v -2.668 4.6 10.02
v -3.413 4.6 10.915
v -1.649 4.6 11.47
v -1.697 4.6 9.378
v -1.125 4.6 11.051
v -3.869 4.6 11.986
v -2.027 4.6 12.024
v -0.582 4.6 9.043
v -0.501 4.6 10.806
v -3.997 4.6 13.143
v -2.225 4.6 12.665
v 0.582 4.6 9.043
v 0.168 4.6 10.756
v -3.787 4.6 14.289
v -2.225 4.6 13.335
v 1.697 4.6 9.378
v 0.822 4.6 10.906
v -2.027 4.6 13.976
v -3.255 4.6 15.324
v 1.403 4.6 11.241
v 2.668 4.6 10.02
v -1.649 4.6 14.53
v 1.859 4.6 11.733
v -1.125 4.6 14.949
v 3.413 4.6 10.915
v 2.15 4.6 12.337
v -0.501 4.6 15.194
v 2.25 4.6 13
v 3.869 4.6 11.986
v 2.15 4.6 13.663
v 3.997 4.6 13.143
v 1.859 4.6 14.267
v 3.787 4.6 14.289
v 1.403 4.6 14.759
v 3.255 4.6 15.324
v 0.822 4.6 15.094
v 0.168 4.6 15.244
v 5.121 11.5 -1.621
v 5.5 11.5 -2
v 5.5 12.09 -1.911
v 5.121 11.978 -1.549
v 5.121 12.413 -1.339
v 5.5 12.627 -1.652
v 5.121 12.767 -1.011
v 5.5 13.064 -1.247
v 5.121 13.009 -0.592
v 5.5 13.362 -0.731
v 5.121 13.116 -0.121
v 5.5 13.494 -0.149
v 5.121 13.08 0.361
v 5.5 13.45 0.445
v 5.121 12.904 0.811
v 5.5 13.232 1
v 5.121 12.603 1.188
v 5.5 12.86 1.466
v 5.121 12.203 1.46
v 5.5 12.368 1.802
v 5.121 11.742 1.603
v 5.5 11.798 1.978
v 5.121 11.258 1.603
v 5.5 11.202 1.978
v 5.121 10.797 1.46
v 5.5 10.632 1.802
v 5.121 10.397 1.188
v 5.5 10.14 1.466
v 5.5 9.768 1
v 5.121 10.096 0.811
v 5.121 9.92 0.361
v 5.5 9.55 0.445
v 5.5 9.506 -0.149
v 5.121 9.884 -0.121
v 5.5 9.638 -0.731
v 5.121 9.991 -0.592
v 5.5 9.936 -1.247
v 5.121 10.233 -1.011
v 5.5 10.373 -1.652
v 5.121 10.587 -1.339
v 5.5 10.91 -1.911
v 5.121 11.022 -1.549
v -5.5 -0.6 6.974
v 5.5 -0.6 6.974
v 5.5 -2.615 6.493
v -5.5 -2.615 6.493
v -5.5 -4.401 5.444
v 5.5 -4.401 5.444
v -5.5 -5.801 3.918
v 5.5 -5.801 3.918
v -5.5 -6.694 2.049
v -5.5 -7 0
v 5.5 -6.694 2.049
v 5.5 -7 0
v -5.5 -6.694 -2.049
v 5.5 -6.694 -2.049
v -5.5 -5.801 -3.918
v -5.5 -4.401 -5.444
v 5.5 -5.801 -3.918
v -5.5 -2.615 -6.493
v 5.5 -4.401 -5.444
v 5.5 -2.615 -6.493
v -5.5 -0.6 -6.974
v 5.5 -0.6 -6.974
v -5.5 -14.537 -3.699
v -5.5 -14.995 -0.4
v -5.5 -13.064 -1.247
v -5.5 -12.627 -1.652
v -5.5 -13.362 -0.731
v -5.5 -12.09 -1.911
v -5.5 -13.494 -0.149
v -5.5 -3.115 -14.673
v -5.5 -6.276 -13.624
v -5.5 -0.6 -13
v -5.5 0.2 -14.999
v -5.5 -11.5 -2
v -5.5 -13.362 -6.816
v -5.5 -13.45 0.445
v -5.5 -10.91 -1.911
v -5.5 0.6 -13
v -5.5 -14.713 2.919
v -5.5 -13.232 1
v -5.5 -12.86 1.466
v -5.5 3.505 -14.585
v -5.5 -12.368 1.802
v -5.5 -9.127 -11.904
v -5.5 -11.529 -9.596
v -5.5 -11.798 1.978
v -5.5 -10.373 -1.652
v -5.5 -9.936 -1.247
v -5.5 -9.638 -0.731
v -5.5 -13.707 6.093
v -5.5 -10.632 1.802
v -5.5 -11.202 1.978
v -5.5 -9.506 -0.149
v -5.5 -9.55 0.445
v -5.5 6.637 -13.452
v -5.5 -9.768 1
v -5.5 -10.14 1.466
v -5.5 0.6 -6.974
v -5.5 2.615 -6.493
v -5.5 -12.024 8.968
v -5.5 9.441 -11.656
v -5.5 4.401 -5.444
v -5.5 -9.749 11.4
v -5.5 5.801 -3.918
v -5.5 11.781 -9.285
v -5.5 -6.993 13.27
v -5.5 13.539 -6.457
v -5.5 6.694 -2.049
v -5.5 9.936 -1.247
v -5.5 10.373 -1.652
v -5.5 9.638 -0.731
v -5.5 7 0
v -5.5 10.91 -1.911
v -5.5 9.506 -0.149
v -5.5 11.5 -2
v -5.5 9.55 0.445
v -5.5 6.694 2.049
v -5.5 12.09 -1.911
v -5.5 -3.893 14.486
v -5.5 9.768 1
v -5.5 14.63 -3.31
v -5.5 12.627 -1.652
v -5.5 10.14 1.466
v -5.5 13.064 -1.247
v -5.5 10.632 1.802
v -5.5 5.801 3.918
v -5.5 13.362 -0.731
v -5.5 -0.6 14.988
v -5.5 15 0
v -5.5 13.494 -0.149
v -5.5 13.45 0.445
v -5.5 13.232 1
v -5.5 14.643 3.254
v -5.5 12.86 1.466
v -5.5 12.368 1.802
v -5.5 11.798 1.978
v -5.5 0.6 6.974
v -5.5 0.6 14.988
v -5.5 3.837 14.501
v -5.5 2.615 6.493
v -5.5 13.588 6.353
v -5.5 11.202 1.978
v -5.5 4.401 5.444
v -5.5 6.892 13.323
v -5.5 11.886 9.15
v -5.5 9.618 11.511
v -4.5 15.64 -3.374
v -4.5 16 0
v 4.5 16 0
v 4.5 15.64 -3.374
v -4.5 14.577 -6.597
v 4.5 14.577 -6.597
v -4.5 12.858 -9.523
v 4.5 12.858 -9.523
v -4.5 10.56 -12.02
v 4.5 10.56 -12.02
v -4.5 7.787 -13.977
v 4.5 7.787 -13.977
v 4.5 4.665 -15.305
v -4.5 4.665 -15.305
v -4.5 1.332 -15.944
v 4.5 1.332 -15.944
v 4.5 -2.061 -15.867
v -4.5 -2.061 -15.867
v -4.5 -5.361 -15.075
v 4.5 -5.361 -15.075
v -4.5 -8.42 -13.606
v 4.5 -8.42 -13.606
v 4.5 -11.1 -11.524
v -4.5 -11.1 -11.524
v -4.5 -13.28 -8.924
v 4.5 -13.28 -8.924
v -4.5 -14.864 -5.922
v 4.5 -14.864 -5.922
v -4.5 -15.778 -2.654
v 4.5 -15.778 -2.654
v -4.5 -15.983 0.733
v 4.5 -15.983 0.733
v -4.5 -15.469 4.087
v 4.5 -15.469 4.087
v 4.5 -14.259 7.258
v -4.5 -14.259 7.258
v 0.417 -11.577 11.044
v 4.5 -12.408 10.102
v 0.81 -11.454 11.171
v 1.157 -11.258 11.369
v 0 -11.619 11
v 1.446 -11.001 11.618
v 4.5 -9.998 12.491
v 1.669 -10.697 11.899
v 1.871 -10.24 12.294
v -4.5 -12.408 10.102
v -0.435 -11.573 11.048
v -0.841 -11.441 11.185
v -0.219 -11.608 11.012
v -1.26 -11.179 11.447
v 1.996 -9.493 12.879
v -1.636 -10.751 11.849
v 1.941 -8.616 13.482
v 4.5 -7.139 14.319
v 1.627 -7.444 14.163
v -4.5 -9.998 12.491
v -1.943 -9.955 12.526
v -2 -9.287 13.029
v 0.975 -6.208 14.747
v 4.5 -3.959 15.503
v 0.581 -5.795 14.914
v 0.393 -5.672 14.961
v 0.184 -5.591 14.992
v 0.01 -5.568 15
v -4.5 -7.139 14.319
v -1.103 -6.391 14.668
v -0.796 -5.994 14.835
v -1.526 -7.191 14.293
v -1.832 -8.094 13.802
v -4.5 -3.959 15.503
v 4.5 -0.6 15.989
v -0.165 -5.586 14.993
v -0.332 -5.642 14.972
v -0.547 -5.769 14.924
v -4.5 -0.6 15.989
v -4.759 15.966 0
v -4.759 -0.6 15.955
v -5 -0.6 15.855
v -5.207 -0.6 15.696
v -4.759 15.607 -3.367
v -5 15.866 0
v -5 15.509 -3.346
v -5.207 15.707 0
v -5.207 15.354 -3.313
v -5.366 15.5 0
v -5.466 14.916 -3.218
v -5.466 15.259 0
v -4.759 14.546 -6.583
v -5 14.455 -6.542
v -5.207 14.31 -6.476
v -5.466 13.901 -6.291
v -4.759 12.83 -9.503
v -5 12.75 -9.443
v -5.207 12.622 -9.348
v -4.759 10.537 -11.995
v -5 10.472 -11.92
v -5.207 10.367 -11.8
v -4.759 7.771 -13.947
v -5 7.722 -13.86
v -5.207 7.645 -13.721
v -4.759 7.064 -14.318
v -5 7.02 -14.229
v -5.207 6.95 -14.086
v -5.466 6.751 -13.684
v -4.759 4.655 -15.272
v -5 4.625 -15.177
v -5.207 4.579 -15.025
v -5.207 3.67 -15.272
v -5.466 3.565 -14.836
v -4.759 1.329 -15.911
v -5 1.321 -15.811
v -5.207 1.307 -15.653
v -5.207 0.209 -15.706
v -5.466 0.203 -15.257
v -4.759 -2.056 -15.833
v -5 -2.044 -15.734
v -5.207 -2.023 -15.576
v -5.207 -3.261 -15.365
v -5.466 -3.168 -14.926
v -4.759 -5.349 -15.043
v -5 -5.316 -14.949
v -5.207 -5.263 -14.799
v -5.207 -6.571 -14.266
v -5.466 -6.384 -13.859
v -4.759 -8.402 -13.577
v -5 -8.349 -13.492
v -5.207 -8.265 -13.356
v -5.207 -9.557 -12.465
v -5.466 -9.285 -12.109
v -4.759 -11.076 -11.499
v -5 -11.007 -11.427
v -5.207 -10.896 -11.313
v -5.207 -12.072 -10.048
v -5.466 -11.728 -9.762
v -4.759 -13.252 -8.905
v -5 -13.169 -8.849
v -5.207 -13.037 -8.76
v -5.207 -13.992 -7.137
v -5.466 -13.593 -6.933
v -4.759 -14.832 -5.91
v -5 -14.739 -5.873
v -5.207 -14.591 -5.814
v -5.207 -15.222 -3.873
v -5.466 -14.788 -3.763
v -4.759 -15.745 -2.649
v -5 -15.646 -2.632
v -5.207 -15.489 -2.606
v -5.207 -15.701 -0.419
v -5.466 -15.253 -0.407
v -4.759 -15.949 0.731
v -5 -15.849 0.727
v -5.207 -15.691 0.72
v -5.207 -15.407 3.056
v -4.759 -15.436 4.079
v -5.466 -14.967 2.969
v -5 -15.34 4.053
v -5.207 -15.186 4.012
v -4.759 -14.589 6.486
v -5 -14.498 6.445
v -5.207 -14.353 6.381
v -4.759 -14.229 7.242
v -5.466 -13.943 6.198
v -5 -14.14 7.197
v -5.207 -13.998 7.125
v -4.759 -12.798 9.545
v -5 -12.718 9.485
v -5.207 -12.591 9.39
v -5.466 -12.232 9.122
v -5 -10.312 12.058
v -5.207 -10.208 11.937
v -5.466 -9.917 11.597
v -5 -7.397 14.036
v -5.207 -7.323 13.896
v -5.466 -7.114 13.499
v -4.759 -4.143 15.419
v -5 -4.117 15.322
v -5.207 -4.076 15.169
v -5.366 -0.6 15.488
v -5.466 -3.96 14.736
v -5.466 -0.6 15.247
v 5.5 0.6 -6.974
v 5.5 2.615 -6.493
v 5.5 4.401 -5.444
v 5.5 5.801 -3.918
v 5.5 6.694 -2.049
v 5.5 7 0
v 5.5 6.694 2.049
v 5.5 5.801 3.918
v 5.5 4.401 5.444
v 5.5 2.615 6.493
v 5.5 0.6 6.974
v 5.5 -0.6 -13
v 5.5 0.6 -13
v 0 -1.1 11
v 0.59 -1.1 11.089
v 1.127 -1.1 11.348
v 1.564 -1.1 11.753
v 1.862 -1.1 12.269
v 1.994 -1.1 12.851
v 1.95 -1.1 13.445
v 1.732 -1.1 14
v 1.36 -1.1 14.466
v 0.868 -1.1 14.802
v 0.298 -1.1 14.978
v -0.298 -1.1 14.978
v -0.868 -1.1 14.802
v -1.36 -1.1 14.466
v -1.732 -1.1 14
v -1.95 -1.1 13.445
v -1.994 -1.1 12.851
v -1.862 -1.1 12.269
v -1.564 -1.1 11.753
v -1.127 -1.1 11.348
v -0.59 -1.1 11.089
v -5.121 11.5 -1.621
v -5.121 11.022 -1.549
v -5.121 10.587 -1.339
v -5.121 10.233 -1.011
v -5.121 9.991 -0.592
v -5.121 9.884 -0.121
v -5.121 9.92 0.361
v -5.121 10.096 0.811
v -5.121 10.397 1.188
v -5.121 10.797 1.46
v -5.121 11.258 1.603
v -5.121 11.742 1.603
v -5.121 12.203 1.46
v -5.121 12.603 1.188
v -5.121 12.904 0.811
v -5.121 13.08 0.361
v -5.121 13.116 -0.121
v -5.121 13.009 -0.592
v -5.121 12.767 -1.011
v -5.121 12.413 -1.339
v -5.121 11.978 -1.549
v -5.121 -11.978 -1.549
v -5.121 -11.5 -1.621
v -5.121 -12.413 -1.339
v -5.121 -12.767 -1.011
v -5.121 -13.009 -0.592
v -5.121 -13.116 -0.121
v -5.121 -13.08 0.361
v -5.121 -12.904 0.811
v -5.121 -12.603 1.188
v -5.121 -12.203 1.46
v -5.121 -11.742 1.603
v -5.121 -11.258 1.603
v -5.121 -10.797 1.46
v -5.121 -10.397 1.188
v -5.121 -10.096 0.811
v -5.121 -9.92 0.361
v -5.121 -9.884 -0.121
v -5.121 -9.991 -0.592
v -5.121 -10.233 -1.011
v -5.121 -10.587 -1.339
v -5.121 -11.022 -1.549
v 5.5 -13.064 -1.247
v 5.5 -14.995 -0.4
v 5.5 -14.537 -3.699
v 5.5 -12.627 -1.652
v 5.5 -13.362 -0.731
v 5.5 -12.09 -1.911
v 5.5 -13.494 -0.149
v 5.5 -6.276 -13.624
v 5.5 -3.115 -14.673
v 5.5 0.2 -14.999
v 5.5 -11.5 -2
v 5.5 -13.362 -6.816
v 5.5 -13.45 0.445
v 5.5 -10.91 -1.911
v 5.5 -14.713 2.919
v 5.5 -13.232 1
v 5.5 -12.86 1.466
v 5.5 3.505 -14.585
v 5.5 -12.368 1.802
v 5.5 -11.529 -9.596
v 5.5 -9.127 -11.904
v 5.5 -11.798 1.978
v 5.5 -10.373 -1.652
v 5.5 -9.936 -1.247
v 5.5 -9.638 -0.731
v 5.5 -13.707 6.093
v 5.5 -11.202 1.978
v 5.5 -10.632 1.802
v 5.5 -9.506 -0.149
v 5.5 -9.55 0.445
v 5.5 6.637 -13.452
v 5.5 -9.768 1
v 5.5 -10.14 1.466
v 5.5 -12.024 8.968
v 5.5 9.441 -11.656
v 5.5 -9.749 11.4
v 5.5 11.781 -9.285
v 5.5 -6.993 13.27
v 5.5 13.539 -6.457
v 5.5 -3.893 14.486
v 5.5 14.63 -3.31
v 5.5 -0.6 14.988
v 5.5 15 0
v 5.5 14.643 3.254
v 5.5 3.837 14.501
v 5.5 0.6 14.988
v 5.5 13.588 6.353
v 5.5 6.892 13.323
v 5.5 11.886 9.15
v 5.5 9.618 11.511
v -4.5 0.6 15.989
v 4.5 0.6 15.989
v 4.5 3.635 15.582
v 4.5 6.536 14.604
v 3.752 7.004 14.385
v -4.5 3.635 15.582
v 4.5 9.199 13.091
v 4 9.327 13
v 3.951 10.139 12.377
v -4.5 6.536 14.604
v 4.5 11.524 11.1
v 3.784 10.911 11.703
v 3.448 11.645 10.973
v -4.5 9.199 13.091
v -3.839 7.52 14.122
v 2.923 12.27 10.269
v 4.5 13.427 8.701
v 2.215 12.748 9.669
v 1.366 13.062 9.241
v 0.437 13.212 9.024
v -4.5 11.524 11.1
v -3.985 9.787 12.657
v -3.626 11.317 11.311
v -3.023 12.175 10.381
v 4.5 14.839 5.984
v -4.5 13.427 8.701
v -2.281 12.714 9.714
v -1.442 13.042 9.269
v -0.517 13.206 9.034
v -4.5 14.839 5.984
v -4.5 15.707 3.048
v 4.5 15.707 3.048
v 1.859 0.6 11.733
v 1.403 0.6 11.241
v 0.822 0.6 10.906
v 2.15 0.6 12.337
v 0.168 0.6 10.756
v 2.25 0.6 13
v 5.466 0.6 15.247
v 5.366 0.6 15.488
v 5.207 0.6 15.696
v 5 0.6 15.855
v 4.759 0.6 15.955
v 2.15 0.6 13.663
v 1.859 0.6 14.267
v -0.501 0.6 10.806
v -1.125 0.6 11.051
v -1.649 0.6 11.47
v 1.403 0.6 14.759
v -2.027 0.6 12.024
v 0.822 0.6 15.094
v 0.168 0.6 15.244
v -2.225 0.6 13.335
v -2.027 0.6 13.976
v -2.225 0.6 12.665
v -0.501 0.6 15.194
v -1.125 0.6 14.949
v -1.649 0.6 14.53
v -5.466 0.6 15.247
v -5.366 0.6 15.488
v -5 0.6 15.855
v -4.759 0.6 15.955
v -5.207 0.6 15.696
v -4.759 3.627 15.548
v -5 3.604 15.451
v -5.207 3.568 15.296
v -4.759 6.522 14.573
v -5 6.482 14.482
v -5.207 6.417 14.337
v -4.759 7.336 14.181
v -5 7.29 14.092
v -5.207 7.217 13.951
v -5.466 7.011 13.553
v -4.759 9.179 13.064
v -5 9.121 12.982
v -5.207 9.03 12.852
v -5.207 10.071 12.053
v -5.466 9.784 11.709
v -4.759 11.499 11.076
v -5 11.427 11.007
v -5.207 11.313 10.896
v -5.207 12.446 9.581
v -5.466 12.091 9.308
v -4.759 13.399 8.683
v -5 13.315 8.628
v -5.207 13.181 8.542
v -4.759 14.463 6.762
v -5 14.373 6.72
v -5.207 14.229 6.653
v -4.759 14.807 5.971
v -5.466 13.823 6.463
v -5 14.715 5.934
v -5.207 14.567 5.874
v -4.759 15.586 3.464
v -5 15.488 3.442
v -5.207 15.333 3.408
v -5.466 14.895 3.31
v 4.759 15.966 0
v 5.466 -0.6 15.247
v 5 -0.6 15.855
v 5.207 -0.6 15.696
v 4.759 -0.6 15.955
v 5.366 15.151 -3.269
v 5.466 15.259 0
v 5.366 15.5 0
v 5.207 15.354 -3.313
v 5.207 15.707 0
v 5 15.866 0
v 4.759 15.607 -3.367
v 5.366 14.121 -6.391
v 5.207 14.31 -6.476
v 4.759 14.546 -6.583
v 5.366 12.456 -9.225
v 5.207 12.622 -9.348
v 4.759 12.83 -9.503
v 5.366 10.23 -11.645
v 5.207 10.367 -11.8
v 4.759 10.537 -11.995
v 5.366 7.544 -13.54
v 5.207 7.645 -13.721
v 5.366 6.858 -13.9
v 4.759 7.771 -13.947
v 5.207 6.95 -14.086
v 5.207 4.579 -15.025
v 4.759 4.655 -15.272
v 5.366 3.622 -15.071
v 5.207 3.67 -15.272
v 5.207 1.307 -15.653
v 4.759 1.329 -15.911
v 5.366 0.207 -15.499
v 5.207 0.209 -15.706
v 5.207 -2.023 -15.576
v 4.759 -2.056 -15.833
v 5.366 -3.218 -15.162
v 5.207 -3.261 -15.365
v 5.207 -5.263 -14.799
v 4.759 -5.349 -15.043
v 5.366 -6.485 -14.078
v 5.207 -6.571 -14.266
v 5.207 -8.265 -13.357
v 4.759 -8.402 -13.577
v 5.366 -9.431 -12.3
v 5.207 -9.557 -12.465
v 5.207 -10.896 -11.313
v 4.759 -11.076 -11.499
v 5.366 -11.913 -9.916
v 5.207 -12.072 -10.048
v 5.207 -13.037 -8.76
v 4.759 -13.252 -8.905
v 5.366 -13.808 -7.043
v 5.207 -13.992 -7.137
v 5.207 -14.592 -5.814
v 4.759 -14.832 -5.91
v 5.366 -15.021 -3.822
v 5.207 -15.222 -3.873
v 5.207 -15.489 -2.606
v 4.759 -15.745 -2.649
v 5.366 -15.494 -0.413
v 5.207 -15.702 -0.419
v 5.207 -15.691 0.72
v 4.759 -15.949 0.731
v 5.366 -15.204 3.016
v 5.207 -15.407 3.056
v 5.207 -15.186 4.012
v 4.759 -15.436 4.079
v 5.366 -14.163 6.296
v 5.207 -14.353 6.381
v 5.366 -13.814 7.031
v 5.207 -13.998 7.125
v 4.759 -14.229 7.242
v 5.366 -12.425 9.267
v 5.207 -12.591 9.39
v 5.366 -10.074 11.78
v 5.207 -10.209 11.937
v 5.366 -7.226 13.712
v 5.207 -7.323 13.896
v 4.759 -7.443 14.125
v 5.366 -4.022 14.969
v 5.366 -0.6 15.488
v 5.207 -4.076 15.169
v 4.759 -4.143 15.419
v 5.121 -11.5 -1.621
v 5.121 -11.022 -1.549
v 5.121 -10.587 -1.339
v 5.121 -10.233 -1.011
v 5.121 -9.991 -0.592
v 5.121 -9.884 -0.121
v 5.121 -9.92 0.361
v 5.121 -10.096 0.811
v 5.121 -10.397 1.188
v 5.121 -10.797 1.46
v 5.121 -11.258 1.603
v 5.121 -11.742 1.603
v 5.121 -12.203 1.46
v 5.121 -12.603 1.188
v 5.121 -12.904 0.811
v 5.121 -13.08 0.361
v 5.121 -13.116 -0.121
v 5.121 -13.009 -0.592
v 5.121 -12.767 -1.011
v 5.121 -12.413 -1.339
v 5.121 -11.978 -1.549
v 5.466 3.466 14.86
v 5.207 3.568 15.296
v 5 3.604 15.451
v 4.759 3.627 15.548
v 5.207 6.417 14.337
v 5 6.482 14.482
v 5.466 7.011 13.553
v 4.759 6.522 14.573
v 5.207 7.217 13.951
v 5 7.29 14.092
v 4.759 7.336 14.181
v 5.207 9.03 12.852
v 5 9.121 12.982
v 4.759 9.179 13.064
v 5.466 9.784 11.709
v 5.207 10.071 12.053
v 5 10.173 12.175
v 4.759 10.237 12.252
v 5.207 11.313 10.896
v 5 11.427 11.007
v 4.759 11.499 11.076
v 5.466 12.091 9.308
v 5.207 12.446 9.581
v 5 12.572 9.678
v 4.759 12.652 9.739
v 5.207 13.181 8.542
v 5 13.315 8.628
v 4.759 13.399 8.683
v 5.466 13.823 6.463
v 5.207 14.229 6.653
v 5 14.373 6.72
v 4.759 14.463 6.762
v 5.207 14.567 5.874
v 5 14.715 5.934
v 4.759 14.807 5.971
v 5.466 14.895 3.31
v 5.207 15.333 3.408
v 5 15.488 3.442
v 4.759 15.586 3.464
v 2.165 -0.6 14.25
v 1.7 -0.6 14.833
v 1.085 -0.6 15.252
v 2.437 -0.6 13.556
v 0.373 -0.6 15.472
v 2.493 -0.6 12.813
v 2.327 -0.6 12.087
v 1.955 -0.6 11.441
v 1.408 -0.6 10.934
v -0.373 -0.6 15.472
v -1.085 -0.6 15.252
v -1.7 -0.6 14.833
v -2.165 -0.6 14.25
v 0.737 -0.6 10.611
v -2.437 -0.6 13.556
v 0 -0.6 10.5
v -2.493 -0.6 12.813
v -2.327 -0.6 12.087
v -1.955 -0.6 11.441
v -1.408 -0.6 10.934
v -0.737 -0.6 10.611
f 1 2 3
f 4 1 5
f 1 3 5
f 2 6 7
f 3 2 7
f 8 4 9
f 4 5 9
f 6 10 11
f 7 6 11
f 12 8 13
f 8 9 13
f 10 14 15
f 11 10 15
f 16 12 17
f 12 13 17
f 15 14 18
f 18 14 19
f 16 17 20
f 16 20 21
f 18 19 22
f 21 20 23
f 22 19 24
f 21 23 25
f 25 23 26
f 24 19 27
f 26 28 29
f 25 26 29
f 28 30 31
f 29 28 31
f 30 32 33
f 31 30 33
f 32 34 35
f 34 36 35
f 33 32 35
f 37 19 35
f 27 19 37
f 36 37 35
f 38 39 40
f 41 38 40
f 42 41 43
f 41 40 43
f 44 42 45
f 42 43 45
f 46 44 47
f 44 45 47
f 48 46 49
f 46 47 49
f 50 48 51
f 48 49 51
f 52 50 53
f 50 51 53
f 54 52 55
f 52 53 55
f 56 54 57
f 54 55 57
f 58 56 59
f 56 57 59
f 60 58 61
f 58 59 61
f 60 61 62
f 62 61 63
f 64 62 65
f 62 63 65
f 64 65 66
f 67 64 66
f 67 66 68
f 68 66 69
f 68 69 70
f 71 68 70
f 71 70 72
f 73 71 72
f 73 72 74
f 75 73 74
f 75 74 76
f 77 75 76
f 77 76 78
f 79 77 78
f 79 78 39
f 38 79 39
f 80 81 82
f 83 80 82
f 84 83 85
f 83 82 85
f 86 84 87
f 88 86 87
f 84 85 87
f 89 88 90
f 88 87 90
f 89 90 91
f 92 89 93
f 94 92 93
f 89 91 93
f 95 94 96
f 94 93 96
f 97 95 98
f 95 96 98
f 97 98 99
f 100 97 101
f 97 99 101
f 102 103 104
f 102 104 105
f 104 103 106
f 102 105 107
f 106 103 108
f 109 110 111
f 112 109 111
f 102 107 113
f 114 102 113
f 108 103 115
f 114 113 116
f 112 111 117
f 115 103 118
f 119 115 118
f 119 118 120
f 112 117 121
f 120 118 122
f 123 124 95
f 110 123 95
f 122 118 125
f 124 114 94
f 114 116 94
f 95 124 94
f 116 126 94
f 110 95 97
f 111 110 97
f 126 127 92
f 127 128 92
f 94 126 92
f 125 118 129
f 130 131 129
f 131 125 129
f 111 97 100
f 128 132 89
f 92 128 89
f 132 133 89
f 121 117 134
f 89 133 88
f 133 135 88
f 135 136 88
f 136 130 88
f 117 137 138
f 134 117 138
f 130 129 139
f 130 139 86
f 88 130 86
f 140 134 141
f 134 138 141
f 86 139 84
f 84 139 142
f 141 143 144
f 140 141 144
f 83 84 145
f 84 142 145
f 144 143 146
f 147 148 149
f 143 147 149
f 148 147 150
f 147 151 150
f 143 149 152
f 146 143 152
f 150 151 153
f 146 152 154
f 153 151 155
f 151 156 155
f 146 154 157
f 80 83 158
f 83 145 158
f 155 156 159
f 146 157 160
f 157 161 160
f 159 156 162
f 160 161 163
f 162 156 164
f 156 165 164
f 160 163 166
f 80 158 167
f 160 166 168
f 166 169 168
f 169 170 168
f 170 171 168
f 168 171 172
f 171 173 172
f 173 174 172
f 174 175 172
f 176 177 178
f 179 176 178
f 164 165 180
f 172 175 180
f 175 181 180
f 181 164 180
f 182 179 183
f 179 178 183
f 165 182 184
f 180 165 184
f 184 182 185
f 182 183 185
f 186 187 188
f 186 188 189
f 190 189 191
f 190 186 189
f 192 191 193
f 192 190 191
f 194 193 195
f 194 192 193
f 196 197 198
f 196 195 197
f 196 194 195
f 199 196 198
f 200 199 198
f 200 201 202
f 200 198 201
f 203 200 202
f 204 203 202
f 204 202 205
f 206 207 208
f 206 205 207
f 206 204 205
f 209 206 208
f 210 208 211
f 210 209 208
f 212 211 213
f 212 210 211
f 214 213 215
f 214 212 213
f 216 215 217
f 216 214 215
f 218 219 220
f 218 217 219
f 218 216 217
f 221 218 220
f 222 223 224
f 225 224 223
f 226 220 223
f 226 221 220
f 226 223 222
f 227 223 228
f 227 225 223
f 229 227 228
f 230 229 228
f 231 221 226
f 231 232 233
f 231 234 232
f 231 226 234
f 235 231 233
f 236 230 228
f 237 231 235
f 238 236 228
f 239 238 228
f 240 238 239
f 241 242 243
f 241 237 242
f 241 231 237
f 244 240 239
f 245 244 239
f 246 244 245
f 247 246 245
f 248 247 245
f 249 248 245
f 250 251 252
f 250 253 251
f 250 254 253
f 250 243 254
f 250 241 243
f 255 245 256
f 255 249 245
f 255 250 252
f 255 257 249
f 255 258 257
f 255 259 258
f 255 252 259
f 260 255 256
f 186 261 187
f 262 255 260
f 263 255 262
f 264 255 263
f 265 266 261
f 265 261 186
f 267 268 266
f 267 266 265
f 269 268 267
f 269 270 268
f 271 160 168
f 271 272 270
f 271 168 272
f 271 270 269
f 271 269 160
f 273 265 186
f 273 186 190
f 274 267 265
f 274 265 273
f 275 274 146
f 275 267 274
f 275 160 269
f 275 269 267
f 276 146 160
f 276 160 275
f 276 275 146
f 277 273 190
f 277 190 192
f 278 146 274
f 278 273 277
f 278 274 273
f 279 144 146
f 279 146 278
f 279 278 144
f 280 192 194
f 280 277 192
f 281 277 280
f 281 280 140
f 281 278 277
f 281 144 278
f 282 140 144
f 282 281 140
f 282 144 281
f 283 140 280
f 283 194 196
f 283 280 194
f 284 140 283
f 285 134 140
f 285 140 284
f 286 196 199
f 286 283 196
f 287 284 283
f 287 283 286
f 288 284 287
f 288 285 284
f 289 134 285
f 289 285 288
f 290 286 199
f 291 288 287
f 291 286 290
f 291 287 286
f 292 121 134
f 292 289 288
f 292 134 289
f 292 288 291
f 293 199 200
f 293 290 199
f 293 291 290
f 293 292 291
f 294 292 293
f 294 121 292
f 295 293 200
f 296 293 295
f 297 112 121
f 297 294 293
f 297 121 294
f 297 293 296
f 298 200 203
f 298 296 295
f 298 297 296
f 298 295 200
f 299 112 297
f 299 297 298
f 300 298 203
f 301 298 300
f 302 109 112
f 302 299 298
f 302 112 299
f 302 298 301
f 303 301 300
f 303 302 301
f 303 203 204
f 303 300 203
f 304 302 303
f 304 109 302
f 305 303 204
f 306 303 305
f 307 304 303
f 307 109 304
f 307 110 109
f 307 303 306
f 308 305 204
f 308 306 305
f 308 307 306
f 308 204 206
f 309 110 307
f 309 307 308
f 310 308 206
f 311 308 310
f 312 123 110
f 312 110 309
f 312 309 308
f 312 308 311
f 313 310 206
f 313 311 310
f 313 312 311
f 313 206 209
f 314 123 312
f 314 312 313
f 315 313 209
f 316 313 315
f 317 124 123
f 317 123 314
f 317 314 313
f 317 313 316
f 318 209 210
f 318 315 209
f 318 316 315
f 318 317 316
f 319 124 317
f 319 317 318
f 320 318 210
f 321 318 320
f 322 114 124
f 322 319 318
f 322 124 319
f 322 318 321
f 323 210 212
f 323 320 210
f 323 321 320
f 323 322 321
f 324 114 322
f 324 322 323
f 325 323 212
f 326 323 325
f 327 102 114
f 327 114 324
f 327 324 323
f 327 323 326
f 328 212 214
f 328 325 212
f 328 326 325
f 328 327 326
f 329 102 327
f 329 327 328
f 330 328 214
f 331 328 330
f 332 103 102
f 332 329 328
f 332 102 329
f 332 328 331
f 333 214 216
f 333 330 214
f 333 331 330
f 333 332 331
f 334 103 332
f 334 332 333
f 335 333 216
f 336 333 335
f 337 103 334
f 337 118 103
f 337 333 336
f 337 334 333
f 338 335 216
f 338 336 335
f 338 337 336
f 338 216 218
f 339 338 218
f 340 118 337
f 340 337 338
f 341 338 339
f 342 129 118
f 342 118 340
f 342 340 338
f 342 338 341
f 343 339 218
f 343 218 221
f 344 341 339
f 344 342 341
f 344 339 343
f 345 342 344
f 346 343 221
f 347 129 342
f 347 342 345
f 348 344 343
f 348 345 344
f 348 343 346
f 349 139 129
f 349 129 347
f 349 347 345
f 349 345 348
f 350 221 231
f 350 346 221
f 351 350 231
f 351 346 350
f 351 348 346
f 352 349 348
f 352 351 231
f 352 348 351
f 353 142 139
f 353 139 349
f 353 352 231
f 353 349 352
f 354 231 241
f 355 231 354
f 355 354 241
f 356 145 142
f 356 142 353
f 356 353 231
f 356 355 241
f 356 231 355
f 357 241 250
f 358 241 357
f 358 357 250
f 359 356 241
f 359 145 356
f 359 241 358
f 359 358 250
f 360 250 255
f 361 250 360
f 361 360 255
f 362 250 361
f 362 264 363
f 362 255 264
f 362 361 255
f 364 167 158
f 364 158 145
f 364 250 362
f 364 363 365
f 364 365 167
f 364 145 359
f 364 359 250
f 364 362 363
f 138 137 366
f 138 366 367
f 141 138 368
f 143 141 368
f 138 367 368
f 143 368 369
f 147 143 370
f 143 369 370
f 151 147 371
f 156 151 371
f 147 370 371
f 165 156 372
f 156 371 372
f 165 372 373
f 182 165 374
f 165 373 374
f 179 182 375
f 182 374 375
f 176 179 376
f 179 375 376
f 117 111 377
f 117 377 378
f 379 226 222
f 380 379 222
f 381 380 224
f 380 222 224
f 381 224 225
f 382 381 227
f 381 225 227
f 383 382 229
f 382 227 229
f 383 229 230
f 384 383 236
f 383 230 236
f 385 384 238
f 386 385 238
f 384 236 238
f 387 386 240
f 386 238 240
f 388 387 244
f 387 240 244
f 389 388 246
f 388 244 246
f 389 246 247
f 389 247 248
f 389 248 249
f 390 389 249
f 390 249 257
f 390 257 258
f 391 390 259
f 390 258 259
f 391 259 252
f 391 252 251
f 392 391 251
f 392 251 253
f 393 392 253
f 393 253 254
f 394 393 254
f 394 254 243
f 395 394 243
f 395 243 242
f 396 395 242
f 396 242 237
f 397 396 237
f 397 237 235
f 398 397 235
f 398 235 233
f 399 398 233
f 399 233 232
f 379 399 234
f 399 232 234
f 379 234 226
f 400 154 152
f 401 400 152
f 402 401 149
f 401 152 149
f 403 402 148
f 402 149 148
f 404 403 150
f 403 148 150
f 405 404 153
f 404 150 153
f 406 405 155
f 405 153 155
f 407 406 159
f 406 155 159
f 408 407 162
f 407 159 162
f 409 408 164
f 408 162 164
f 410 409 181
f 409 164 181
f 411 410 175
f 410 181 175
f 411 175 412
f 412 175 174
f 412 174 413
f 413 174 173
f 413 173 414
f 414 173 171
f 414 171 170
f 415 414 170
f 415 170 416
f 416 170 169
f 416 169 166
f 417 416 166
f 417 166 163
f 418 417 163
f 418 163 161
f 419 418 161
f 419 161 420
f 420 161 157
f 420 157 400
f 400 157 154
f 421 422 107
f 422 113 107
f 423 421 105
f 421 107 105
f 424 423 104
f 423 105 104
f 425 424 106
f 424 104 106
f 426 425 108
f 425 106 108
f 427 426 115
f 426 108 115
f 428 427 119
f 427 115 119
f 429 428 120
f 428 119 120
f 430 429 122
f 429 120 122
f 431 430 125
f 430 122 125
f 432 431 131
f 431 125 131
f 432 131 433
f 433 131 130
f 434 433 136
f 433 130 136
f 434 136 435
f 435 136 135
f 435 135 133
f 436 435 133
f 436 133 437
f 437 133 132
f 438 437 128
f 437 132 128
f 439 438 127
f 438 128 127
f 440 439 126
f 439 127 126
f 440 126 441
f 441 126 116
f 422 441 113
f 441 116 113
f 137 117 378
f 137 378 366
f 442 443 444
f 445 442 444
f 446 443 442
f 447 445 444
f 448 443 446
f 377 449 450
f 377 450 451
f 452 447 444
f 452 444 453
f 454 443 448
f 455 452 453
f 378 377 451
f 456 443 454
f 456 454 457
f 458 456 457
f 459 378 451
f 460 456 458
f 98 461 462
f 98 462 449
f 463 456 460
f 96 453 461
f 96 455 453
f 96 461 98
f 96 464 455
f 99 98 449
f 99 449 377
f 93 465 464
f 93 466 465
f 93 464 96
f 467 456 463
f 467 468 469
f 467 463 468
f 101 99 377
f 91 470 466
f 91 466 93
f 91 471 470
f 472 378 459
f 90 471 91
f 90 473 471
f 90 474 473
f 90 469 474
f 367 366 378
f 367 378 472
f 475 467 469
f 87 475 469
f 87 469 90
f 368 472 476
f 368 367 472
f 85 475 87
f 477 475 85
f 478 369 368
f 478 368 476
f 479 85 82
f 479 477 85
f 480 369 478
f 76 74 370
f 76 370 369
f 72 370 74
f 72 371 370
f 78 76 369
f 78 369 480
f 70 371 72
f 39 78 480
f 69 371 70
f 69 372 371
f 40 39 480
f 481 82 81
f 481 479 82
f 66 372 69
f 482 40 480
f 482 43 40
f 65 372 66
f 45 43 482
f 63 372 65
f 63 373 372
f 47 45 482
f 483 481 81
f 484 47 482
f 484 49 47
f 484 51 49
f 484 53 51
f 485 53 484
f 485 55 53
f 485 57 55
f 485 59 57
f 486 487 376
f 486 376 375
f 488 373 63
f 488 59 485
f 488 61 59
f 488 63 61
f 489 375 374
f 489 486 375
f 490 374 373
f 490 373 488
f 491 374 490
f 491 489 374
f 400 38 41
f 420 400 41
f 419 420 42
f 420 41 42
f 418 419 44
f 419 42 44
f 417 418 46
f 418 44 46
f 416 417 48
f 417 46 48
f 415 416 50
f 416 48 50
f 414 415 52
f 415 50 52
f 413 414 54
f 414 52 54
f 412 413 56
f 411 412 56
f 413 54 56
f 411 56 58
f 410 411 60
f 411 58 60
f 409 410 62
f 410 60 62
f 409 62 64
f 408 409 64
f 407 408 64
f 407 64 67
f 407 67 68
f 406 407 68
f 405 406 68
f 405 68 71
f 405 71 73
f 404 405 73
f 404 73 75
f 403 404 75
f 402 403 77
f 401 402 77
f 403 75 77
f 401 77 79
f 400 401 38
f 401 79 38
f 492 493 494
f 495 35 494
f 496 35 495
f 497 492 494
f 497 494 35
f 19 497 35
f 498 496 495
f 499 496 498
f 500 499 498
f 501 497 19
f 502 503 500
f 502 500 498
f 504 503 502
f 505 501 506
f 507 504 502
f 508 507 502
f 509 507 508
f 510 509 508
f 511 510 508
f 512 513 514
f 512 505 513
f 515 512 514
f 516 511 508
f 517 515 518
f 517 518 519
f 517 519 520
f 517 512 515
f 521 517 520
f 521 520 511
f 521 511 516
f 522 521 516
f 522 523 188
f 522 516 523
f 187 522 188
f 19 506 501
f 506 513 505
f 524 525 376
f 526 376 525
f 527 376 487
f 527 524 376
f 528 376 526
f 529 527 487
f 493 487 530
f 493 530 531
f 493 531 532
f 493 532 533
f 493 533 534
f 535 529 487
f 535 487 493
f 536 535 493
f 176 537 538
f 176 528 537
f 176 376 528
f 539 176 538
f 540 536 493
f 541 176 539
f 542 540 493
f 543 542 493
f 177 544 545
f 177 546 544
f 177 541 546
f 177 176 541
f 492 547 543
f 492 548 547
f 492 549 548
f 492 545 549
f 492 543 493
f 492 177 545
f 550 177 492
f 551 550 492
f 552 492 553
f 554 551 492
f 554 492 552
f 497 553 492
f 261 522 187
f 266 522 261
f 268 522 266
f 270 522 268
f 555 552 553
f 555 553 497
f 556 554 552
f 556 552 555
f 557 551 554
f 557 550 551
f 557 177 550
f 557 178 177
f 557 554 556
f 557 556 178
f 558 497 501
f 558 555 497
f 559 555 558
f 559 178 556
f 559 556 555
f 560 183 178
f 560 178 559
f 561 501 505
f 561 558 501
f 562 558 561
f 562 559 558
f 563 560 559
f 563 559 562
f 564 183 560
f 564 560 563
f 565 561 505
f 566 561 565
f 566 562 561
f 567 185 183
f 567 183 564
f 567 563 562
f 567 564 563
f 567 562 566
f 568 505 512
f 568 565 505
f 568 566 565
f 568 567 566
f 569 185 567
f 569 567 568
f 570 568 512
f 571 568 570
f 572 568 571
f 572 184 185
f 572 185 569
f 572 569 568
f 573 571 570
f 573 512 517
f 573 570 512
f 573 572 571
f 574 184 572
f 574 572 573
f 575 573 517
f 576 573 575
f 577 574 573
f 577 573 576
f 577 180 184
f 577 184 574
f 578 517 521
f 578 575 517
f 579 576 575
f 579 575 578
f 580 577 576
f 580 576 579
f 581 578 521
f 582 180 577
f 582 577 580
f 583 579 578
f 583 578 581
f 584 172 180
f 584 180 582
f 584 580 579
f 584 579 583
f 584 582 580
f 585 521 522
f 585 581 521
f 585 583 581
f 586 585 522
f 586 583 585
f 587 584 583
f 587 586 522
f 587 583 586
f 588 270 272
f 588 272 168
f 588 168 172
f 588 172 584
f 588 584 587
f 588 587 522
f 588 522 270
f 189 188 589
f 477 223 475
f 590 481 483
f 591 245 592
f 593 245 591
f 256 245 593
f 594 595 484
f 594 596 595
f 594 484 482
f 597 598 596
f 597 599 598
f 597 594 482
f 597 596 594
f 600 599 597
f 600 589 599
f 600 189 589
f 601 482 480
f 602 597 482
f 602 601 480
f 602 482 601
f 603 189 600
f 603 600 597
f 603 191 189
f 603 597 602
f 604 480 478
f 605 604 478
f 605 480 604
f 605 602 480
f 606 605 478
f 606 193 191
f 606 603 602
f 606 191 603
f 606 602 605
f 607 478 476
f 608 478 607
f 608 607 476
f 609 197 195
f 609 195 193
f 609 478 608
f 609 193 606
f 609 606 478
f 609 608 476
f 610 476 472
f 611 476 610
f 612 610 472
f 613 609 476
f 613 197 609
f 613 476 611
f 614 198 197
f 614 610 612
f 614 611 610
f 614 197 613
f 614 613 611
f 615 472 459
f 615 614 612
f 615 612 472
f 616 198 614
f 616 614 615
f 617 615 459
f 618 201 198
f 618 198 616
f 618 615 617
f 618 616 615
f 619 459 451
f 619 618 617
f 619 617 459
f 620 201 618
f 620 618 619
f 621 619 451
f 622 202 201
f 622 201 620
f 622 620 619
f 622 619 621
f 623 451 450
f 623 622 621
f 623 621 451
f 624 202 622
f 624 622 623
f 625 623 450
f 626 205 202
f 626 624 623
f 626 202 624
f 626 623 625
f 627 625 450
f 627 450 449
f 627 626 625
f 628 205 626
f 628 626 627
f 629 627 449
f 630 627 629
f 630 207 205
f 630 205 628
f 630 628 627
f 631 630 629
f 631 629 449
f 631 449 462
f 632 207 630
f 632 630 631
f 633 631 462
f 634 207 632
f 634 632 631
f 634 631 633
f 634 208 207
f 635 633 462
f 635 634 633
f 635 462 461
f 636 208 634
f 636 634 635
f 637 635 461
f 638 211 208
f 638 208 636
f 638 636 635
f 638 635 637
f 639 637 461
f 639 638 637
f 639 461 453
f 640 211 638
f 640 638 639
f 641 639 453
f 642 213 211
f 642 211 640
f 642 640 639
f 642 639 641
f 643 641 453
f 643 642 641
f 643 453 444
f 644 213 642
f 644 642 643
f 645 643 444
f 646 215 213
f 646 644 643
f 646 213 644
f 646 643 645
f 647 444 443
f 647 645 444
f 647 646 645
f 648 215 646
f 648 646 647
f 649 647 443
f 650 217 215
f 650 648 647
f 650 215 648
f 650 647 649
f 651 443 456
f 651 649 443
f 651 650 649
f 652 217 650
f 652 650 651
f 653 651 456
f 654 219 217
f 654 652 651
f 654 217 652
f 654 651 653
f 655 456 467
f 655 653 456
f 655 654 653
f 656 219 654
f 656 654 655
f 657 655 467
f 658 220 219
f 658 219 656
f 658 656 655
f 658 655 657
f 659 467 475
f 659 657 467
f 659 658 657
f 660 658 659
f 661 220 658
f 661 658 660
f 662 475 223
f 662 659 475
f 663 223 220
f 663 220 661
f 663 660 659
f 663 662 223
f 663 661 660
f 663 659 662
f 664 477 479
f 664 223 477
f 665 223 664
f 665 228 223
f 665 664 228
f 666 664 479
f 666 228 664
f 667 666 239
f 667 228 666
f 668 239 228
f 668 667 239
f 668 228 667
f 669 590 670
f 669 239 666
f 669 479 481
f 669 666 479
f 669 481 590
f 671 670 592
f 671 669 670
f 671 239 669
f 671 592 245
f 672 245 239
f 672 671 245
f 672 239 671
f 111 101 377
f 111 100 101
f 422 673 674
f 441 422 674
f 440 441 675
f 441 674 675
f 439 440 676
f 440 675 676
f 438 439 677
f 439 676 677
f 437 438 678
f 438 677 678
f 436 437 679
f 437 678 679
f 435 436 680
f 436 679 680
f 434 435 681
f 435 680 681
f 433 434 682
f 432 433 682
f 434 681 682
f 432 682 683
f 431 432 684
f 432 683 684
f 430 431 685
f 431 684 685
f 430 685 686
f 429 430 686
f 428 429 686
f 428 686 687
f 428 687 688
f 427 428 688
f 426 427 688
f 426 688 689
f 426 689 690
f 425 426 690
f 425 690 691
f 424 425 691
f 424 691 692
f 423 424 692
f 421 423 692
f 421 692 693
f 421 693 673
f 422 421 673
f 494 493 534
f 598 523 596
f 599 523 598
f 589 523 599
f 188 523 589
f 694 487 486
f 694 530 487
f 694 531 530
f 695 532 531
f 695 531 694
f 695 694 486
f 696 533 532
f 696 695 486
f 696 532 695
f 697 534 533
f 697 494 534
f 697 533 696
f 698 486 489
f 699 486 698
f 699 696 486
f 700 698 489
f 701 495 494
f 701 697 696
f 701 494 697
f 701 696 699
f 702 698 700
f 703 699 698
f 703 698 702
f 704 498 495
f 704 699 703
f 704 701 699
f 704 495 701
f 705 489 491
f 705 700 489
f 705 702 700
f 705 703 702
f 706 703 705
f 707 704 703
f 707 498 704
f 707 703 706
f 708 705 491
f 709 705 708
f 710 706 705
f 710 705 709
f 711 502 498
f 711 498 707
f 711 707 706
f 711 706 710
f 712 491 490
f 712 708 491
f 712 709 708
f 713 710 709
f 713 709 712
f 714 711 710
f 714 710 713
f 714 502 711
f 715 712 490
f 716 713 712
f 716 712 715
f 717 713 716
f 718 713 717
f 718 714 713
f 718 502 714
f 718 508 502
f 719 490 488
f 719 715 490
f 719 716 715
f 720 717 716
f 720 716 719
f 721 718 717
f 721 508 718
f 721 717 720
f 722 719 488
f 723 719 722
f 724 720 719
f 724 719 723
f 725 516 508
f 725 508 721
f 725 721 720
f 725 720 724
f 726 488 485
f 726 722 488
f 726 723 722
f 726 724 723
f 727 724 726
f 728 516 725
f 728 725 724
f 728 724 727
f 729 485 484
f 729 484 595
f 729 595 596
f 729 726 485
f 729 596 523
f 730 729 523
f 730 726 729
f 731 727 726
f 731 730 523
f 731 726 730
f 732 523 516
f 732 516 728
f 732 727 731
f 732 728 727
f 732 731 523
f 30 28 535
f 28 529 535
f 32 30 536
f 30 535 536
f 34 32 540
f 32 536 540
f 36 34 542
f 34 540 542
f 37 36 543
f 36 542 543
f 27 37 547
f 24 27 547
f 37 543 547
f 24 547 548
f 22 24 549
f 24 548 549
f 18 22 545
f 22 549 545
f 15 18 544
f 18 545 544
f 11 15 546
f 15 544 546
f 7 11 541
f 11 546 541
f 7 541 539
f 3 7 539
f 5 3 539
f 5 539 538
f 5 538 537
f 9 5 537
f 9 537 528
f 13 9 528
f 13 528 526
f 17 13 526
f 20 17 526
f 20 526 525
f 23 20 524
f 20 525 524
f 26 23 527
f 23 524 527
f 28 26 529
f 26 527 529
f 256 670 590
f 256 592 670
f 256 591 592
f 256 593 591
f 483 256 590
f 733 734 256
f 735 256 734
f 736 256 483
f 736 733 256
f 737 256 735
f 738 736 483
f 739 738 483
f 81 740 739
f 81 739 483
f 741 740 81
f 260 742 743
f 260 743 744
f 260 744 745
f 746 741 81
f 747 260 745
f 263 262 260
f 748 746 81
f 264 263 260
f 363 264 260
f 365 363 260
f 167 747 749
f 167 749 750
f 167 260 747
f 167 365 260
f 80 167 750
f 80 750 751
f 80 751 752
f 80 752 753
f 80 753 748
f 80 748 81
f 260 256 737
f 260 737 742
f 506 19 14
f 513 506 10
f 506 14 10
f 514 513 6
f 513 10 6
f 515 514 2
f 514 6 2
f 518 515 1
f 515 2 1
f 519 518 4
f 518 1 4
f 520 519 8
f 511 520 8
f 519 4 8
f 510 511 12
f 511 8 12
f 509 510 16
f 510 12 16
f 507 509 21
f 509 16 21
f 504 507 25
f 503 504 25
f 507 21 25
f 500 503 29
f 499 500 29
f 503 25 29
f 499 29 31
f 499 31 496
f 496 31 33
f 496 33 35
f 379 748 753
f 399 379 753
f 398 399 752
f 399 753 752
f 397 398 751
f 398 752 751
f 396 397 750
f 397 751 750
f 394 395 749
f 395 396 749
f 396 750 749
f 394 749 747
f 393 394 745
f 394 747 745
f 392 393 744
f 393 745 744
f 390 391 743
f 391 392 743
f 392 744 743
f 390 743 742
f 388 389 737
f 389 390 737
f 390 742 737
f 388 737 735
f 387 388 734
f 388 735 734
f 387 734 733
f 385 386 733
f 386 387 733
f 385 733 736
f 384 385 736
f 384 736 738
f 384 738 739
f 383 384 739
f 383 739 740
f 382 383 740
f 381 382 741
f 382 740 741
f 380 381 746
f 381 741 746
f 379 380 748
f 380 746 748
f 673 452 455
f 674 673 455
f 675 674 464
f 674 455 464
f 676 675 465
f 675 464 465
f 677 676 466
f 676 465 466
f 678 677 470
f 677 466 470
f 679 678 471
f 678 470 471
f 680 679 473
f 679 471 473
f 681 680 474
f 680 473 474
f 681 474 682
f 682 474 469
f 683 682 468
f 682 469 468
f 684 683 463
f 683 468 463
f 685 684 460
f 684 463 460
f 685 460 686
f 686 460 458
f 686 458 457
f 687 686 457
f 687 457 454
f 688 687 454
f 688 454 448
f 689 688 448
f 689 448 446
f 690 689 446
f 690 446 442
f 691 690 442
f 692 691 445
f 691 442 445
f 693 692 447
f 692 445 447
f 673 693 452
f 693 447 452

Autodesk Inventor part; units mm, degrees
sketch "Skizze_1" plane through (0, 0, 0) normal (0, 0, 1) x (1, 0, 0)
  line L0 (5.5, 0) -> (-5.5, 0)
  line L1 (-5.5, 15) -> (-5.5, 7)
  line L2 (-5.5, 7) -> (5.5, 7)
  line L3 (5.5, 7) -> (5.5, 15)
  arc A0 (5.5, 15) -> (4.5, 16) centre (4.5, 15) ccw
  line L4 (4.5, 16) -> (-4.5, 16)
  arc A1 (-4.5, 16) -> (-5.5, 15) centre (-4.5, 15) ccw
revolve "Revolution1" add sketch "Skizze_1" angle 360 about axis through (5.5, 0, 0) along (1, 0, 0)
sketch "Sketch_4" plane through (0, 0, 0) normal (1, 0, 0) x (0, 0, -1)
  line L0 (-21, 0.6) -> (-21, -0.6)
  line L1 (-21, -0.6) -> (13, -0.6)
  line L2 (13, -0.6) -> (13, 0.6)
  line L3 (13, 0.6) -> (-21, 0.6)
extrude "Extrusion1" cut sketch "Sketch_4" along normal mid plane 22
sketch "Sketch_6" plane through (0, 0, 13) normal (0, 0, 1) x (1, 0, 0)
  line L0 (0, 0) -> (0, 21)
  line L1 (0, 21) -> (4, 21)
  line L2 (4, 21) -> (4, 4.6)
  line L3 (4, 4.6) -> (2.25, 4.6)
  line L4 (2.25, 4.6) -> (2.25, 0)
  line L5 (2.25, 0) -> (0, 0)
  line L6 (0, 0) -> (0, 21)
revolve "Revolution2" cut sketch "Sketch_6" angle 360 about axis through (0, 0, 13) along (0, -1, 0)
sketch "Sketch_2" plane through (0, 11.5, 0) normal (0, 1, 0) x (1, 0, 0)
  line L0 (5.5, 0) -> (-5.5, 0)
  line L1 (-5.5, 0) -> (-5.5, 2)
  line L2 (-5.5, 2) -> (-5.121, 1.621)
  line L3 (-5.121, 1.621) -> (5.121, 1.621)
  line L4 (5.121, 1.621) -> (5.5, 2)
  line L5 (5.5, 2) -> (5.5, 0)
  line L6 (5.5, 0) -> (-5.5, 0)
revolve "Revolution3" cut sketch "Sketch_2" angle 360 about axis through (5.5, 11.5, 0) along (1, 0, 0)
thread "Thread1" size "M4x0.7" class "6H" standard "ISO Metric profile" full length
sketch "Sketch_3" plane through (0, -11.5, 0) normal (0, 1, 0) x (1, 0, 0)
  line L0 (5.5, 0) -> (-5.5, 0)
  line L1 (-5.5, 0) -> (-5.5, 2)
  line L2 (-5.5, 2) -> (-5.121, 1.621)
  line L3 (-5.121, 1.621) -> (5.121, 1.621)
  line L4 (5.121, 1.621) -> (5.5, 2)
  line L5 (5.5, 2) -> (5.5, 0)
  line L6 (5.5, 0) -> (-5.5, 0)
revolve "Revolution4" cut sketch "Sketch_3" angle 360 about axis through (5.5, -11.5, 0) along (1, 0, 0)
thread "Thread2" size "M4x0.7" class "6H" standard "ISO Metric profile" full length
sketch "Sketch_1" plane through (0, 0, 0) normal (1, 0, 0) x (0, 0, -1)
  line L0 (-13, -9.5555) -> (-13, -0.6)
  line L1 (-13, -0.6) -> (-10.5, -0.6)
  line L2 (-10.5, -0.6) -> (-11, -1.1)
  line L3 (-11, -1.1) -> (-11, -11.8471)
  line L4 (-11, -11.8471) -> (-13, -9.5555)
  line L5 (-13, -9.5555) -> (-13, -0.6)
revolve "Revolution5" cut sketch "Sketch_1" angle 360 about axis through (0, -9.5555, 13) along (0, -1, 0)
ref_plane "D2X1_XY" through (5.5, 16, 0) normal (0, 0, 1) x (1, 0, 0)
ref_plane "D2X1_YZ" through (5.5, 16, 0) normal (1, 0, 0) x (0, 1, 0)
ref_plane "D2X1_ZX" through (5.5, 16, 0) normal (0, 1, 0) x (0, 0, 1)
ref_plane "D2X2_XY" through (5.5, -16, 0) normal (0, 0, 1) x (1, 0, 0)
ref_plane "D2X2_YZ" through (5.5, -16, 0) normal (1, 0, 0) x (0, 1, 0)
ref_plane "D2X2_ZX" through (5.5, -16, 0) normal (0, 1, 0) x (0, 0, 1)
ref_plane "schraubenkopf_XY" through (0, 4.6, 13) normal (0, 1, 0) x (1, 0, 0)
ref_plane "schraubenkopf_YZ" through (0, 4.6, 13) normal (1, 0, 0) x (0, 0, -1)
ref_plane "schraubenkopf_ZX" through (0, 4.6, 13) normal (0, 0, -1) x (0, 1, 0)
properties part number "62311400GA_1"
